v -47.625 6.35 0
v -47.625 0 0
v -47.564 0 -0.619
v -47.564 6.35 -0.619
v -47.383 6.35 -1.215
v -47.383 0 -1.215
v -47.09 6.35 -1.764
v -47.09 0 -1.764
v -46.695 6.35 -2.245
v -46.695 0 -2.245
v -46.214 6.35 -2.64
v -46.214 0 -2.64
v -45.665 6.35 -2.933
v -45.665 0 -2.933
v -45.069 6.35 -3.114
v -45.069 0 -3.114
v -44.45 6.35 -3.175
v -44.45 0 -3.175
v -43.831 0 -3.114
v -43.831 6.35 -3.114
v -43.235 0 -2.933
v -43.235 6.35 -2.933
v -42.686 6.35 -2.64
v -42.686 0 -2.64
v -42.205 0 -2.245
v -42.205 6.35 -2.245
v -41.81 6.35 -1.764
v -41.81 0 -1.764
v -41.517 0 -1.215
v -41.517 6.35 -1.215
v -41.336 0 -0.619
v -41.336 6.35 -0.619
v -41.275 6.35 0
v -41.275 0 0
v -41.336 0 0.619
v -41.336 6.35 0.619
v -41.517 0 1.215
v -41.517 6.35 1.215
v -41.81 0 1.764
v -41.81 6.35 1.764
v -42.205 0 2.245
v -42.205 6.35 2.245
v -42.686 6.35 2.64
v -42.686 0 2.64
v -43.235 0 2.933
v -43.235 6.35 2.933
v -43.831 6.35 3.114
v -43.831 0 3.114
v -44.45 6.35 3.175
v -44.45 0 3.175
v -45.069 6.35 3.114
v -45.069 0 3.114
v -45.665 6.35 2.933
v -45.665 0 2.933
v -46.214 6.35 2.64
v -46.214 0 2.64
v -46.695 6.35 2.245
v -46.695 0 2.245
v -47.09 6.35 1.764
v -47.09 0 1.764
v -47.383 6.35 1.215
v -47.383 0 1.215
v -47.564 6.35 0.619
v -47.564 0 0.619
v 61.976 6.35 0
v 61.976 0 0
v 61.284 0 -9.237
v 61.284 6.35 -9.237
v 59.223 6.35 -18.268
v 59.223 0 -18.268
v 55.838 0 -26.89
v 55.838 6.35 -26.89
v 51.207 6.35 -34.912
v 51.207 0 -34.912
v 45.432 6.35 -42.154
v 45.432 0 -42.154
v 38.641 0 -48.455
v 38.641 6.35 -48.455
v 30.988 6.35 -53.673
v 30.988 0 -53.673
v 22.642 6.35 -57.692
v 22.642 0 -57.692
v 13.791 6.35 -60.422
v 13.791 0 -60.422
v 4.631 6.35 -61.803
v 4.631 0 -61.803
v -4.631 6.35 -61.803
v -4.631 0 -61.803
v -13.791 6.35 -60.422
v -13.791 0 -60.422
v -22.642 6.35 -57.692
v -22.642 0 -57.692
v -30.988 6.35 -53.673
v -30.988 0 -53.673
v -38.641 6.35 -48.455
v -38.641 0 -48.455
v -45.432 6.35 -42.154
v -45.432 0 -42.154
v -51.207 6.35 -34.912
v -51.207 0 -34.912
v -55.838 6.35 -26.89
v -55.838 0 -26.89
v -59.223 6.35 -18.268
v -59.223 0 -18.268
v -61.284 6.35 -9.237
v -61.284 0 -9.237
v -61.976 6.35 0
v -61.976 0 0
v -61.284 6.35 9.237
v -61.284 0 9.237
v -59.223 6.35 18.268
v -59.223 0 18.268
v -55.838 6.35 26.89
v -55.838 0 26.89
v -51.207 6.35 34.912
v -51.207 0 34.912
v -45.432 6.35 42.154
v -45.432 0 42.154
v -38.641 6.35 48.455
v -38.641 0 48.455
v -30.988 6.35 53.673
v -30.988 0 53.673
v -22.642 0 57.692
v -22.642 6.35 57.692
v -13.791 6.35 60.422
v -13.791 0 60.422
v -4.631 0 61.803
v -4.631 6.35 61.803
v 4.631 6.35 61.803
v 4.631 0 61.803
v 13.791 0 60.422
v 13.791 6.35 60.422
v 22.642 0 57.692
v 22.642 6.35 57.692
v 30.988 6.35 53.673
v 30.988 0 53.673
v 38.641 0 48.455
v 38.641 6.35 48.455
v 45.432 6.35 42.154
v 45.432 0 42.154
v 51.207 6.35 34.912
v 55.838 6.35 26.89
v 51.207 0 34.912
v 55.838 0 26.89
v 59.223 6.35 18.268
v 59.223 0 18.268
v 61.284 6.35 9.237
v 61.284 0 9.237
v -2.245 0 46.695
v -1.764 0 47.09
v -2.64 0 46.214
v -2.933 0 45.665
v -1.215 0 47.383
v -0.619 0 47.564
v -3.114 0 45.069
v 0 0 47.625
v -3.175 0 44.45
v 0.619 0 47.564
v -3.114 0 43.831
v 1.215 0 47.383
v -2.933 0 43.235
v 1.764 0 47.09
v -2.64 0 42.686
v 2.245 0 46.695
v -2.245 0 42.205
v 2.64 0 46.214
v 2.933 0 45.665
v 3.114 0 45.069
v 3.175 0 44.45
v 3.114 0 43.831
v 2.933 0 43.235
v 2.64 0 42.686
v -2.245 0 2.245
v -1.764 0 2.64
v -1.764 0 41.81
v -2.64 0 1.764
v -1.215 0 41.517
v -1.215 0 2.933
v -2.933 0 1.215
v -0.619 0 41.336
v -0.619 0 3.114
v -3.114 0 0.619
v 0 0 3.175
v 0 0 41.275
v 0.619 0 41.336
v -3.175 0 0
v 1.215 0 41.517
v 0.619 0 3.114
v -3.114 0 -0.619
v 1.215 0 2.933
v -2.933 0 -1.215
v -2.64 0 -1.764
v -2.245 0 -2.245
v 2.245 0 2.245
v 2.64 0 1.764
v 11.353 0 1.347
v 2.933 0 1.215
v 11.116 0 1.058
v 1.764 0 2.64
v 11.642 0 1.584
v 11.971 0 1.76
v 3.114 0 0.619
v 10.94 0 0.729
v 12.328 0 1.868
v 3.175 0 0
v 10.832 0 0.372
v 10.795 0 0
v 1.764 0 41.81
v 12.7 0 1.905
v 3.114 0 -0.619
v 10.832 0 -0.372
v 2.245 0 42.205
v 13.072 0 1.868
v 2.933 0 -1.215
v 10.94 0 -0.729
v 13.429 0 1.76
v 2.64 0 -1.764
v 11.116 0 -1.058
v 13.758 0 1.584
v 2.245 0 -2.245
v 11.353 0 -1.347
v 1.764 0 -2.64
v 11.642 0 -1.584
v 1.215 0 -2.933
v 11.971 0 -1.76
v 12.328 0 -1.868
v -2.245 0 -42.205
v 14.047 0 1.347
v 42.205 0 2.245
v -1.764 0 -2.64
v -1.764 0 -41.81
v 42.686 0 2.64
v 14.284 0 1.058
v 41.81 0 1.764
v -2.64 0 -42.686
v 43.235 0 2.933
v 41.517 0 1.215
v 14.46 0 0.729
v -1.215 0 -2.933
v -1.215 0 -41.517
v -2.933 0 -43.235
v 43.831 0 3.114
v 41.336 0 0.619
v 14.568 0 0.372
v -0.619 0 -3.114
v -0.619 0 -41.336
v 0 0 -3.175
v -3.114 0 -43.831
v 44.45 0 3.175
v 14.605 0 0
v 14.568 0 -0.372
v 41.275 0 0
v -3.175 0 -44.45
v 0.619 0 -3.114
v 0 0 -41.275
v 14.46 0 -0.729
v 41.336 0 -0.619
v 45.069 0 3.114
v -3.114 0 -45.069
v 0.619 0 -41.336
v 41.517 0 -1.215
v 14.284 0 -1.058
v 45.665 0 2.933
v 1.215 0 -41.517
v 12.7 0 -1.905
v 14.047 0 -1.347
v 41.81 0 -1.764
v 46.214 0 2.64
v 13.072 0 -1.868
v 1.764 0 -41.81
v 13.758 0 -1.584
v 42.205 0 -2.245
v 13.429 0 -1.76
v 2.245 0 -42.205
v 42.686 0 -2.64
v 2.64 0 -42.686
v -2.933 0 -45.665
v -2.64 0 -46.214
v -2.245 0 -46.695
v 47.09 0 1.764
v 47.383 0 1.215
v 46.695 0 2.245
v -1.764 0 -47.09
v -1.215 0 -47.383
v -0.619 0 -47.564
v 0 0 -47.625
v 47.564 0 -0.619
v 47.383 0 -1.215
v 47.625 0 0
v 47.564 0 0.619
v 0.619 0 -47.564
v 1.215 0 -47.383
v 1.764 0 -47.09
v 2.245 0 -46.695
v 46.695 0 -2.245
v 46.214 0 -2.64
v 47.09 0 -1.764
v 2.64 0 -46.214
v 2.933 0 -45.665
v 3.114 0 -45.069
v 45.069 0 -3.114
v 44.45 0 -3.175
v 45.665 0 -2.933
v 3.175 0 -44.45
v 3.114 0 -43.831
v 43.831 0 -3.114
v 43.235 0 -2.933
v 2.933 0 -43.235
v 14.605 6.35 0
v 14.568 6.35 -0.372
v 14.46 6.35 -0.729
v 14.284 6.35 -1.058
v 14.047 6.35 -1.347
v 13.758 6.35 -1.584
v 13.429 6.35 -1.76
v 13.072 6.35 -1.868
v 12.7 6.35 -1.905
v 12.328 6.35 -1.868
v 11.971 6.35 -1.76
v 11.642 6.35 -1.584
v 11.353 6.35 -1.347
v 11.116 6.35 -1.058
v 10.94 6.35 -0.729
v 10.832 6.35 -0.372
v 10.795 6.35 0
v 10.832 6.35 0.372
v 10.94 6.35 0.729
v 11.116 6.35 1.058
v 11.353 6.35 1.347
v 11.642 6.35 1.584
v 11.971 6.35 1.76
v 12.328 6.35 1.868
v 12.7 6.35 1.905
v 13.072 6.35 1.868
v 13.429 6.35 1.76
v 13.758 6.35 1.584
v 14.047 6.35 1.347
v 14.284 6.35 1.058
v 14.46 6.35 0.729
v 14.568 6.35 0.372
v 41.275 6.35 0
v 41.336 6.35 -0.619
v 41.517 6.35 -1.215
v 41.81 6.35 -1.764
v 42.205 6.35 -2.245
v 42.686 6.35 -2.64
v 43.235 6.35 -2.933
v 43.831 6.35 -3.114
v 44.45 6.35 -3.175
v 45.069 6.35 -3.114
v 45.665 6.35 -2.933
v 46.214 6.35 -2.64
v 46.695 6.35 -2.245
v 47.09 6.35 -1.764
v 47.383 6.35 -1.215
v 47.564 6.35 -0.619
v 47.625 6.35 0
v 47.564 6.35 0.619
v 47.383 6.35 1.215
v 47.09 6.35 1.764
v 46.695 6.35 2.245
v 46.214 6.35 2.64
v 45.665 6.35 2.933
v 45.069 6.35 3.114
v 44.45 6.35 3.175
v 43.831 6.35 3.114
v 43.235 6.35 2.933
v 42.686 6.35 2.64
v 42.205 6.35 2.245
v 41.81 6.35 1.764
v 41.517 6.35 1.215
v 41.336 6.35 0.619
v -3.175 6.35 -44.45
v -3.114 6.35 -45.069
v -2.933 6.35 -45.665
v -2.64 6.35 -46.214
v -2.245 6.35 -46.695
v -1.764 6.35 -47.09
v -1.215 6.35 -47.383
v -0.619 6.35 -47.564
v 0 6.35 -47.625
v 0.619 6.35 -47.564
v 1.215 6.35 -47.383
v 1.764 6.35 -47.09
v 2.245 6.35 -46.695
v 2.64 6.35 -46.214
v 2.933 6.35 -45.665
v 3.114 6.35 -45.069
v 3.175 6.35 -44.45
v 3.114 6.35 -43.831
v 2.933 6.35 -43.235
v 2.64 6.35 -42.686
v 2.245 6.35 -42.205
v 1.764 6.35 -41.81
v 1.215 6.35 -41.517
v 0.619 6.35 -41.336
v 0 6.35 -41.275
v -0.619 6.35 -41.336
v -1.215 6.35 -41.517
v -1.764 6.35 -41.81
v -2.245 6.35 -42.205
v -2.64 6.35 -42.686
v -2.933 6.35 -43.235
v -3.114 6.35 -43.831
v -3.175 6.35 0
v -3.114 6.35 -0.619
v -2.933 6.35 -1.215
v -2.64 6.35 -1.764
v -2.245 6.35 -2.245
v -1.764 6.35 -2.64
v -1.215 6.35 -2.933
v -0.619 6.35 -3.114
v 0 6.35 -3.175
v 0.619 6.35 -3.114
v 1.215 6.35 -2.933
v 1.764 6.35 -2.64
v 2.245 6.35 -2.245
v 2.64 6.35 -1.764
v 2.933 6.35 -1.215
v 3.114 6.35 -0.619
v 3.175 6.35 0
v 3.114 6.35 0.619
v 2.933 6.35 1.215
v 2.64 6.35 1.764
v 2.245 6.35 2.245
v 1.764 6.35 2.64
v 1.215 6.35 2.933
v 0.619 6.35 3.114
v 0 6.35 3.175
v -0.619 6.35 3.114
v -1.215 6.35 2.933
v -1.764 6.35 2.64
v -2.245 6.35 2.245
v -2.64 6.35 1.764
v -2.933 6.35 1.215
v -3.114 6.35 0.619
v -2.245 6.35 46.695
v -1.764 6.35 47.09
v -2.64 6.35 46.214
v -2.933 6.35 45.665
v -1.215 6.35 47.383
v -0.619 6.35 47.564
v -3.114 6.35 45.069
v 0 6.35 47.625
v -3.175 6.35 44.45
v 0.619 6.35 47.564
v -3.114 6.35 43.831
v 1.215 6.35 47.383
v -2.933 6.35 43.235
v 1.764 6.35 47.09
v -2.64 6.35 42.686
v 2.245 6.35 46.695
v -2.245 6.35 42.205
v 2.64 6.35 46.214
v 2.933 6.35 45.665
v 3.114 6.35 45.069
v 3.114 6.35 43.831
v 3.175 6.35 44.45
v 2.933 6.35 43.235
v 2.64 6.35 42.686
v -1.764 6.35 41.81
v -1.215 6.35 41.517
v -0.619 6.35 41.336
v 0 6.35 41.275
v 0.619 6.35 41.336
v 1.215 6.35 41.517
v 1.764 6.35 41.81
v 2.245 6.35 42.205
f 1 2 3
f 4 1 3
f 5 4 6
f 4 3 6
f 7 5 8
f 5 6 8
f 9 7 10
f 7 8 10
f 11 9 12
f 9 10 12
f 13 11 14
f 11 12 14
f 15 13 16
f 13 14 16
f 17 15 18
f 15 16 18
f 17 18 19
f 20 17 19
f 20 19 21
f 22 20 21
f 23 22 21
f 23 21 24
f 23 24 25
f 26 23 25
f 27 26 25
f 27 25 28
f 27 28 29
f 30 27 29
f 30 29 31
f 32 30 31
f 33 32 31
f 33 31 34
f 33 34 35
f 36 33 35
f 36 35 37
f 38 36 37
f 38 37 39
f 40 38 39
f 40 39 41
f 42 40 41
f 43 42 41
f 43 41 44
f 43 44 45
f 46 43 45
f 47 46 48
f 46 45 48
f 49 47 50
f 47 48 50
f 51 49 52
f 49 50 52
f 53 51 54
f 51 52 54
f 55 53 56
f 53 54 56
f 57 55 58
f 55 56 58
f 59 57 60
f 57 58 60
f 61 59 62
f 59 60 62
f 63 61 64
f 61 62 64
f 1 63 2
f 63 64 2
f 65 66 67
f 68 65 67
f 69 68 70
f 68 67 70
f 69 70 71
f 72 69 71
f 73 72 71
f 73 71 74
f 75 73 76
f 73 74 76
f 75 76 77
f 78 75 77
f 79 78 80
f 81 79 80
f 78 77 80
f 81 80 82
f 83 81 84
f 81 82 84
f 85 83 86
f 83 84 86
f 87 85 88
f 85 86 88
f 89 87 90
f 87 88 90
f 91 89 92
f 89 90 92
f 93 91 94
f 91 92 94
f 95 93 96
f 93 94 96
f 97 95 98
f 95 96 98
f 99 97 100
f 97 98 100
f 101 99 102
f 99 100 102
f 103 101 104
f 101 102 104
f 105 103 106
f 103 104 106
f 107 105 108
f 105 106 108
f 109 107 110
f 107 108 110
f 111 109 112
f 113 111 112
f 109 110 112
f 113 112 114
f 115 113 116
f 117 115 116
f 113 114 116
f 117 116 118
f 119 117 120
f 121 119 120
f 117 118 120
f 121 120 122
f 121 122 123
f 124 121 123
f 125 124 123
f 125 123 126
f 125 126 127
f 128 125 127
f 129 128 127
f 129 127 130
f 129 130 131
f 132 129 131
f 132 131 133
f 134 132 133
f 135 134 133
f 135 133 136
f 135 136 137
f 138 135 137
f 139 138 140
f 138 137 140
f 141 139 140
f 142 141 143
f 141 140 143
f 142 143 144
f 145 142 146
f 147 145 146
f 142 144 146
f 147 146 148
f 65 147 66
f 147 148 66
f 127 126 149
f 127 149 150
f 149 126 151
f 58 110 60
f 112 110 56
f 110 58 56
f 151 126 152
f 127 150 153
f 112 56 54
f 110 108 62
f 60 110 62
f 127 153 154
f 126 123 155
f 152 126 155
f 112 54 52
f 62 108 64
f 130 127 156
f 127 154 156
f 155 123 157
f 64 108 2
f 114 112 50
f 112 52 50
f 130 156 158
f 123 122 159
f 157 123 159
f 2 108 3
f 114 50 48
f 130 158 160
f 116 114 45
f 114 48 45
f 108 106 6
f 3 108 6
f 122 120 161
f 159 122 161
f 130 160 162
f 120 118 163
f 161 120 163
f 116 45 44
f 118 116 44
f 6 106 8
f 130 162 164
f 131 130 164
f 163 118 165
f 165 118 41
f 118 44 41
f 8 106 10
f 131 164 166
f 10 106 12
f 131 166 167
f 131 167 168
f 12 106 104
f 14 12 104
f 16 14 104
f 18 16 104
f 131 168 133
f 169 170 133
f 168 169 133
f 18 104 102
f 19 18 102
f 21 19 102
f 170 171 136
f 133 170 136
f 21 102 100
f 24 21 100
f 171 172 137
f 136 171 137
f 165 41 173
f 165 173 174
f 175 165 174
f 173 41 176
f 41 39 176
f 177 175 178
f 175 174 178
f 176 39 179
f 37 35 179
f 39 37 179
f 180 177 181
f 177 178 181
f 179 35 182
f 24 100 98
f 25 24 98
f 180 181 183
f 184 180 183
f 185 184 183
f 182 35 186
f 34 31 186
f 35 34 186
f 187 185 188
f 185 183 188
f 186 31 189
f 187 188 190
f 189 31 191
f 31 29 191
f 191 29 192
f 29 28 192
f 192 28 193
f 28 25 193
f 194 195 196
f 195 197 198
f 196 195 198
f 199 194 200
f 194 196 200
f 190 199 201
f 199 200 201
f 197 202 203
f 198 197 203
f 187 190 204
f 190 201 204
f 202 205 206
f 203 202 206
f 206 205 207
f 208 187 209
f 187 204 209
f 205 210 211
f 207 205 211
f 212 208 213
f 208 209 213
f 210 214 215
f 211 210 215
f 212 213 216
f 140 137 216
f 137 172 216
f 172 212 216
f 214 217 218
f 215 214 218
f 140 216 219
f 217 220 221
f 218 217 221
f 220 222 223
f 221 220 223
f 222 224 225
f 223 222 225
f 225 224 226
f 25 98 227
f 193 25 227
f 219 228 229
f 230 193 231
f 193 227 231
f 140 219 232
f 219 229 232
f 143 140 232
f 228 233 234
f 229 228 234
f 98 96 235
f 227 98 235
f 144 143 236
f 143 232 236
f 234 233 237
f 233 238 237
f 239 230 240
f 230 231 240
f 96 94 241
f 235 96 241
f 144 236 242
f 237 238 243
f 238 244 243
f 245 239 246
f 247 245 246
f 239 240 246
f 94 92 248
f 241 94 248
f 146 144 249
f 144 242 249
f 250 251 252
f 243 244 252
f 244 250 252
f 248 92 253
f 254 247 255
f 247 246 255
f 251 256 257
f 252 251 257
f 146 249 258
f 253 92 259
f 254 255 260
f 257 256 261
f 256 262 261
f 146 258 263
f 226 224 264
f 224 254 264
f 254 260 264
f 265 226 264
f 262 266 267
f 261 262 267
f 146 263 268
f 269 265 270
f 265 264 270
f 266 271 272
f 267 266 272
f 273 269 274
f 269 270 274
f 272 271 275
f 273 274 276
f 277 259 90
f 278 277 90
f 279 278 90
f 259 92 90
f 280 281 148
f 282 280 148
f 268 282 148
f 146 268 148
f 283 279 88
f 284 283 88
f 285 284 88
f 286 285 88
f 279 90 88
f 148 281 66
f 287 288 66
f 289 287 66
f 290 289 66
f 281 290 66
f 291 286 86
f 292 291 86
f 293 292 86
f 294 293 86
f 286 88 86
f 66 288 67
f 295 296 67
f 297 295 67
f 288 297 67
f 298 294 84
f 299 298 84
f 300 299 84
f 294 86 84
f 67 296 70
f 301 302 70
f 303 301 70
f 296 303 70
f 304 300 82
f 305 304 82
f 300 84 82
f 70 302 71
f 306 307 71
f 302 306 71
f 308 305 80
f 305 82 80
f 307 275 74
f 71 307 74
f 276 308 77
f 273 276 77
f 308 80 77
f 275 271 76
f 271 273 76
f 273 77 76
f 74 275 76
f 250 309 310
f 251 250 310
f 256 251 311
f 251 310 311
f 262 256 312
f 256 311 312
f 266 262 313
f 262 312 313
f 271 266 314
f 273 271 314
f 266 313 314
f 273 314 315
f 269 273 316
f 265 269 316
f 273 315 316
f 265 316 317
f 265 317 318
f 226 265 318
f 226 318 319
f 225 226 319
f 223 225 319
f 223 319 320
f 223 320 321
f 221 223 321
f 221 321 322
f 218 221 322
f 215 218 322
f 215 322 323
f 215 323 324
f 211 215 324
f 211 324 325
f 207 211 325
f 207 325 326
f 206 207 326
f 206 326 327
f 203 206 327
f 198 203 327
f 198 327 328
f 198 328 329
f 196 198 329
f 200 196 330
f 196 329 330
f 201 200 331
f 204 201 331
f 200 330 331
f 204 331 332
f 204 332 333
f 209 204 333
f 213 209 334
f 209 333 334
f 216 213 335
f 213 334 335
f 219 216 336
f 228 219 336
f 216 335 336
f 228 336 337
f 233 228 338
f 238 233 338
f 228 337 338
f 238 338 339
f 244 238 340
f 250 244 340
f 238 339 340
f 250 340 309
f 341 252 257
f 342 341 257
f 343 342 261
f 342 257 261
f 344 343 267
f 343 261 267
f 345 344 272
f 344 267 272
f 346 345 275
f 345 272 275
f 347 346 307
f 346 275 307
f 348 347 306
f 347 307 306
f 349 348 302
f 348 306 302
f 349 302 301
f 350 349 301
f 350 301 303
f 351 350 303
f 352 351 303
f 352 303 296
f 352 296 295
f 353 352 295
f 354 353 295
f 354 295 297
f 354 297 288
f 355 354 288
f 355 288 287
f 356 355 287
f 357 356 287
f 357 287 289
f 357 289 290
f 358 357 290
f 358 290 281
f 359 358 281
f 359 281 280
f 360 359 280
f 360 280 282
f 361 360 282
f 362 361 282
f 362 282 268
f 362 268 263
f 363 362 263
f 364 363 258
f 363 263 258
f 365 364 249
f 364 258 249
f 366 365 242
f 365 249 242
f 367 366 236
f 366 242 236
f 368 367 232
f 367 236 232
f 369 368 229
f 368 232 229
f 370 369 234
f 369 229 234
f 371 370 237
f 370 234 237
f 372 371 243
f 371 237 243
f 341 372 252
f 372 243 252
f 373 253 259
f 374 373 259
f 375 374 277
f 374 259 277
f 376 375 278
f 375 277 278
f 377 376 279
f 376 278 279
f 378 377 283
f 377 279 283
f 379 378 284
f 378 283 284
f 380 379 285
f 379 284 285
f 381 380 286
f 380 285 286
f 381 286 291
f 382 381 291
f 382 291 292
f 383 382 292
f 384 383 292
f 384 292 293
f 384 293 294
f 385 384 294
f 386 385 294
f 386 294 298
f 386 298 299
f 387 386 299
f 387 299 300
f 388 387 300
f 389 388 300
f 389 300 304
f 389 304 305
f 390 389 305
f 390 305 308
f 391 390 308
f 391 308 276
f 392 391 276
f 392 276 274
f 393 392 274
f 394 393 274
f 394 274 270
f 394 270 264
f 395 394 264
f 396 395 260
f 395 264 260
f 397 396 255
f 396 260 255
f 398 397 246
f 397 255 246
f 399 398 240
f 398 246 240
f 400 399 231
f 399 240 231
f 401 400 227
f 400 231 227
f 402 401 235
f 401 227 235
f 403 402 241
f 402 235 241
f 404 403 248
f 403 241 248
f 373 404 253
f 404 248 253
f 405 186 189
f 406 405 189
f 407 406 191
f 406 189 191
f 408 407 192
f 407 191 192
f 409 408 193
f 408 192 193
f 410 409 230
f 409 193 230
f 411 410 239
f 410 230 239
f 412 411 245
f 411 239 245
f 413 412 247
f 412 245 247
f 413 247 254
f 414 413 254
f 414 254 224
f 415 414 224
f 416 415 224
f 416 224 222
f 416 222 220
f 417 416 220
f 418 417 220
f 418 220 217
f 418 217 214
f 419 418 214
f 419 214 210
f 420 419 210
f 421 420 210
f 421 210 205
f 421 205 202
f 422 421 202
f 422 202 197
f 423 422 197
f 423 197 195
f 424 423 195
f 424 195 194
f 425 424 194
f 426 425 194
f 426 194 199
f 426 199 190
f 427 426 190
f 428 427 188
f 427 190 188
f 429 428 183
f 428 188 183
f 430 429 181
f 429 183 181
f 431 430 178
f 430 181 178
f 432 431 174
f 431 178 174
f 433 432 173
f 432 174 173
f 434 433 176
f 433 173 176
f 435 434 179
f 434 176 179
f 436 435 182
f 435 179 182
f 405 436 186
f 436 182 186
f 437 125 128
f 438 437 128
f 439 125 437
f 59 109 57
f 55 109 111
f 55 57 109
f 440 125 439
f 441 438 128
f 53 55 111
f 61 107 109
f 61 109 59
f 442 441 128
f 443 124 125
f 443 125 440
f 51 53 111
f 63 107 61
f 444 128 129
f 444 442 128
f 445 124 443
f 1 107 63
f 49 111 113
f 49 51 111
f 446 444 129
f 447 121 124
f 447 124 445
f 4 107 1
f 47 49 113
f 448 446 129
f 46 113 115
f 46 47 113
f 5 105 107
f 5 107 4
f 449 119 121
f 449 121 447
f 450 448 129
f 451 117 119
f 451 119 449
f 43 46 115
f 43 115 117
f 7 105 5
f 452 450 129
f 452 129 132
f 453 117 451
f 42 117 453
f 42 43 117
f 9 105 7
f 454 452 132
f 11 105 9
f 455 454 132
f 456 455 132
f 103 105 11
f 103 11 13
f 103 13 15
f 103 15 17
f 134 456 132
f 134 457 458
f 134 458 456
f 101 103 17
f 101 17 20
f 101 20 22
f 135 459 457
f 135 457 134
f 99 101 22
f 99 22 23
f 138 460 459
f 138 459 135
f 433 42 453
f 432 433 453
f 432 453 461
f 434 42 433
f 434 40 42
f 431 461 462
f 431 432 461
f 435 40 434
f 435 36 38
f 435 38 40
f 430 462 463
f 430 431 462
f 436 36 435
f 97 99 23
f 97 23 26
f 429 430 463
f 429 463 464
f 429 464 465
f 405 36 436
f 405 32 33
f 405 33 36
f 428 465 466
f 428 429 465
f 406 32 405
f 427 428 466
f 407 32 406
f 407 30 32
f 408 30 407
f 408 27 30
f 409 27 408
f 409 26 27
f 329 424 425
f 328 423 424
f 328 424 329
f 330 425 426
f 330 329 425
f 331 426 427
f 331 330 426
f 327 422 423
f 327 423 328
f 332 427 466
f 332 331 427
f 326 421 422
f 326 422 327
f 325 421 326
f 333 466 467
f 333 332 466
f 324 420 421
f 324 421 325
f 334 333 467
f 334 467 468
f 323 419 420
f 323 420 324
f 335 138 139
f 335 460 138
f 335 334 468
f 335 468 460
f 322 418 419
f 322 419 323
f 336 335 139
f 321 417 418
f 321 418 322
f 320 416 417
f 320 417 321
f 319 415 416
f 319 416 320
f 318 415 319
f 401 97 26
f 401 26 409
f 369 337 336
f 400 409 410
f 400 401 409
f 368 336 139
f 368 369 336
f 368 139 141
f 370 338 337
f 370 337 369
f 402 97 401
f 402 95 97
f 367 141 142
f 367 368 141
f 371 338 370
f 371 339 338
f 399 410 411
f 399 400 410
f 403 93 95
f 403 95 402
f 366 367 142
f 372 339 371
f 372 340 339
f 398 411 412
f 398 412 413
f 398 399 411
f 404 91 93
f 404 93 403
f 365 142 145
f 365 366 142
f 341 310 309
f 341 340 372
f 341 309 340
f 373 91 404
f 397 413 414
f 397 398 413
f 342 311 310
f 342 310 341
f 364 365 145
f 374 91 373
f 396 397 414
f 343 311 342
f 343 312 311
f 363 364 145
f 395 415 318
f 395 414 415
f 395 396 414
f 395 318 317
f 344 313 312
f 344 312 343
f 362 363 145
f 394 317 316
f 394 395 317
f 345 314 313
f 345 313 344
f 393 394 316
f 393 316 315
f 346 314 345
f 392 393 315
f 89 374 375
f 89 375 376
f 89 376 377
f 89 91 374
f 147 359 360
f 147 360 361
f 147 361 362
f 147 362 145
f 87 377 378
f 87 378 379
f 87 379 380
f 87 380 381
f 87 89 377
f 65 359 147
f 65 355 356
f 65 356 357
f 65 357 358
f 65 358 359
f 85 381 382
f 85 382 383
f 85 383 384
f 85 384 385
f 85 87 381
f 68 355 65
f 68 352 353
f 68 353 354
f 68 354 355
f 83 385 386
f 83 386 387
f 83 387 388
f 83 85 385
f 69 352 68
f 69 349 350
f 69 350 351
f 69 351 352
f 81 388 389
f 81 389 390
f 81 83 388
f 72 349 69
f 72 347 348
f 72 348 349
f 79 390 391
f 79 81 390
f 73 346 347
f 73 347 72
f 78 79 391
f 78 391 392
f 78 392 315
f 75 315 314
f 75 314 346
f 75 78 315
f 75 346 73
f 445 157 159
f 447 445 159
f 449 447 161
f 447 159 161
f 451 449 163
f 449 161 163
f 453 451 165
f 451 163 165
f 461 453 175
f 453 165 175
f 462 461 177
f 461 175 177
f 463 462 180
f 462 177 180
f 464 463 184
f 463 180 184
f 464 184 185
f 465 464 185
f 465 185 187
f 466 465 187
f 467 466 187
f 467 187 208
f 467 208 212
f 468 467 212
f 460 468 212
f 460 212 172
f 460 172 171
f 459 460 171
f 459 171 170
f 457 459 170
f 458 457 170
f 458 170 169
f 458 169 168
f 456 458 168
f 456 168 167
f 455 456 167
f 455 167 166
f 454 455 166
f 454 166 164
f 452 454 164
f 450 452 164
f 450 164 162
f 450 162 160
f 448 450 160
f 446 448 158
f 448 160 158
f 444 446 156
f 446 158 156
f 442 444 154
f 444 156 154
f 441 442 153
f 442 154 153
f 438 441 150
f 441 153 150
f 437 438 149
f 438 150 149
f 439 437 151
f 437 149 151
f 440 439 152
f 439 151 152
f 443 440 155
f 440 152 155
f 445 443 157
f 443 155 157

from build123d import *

# Parameters (mm, degrees)
SKETCH1_R                       = 61.976
BOSS_EXTRUDE1_DEPTH             = 6.35
F_1_4_0_25_DIAMETER_HOLE1_D     = 6.35
F_1_4_0_25_DIAMETER_HOLE1_DEPTH = 44.958
SKETCH4_R                       = 1.905
CUT_EXTRUDE1_DEPTH              = 7.35


with BuildPart() as part:
    # Sketch1 → Boss-Extrude1 (new body)
    with BuildSketch(Plane(origin=(0, 0, 0), x_dir=(1, 0, 0), z_dir=(0, 1, 0))):
        Circle(SKETCH1_R)
    extrude(amount=BOSS_EXTRUDE1_DEPTH)

    # 1/4 (0.25) Diameter Hole1
    with Locations(Plane(origin=(0, 6.35, 0), x_dir=(1, 0, 0), z_dir=(0, 1, 0))):
        with Locations((0, 44.45), (44.45, 0), (0, -44.45), (-44.45, 0), (0, 0)):
            Hole(F_1_4_0_25_DIAMETER_HOLE1_D / 2, depth=F_1_4_0_25_DIAMETER_HOLE1_DEPTH)

    # Sketch4 → Cut-Extrude1 (cut, through all)
    with BuildSketch(Plane(origin=(0, 6.35, 0), x_dir=(1, 0, 0), z_dir=(0, 1, 0))):
        with Locations((12.7, 0)):
            Circle(SKETCH4_R)
    extrude(amount=-CUT_EXTRUDE1_DEPTH, mode=Mode.SUBTRACT)


solid = part.part
